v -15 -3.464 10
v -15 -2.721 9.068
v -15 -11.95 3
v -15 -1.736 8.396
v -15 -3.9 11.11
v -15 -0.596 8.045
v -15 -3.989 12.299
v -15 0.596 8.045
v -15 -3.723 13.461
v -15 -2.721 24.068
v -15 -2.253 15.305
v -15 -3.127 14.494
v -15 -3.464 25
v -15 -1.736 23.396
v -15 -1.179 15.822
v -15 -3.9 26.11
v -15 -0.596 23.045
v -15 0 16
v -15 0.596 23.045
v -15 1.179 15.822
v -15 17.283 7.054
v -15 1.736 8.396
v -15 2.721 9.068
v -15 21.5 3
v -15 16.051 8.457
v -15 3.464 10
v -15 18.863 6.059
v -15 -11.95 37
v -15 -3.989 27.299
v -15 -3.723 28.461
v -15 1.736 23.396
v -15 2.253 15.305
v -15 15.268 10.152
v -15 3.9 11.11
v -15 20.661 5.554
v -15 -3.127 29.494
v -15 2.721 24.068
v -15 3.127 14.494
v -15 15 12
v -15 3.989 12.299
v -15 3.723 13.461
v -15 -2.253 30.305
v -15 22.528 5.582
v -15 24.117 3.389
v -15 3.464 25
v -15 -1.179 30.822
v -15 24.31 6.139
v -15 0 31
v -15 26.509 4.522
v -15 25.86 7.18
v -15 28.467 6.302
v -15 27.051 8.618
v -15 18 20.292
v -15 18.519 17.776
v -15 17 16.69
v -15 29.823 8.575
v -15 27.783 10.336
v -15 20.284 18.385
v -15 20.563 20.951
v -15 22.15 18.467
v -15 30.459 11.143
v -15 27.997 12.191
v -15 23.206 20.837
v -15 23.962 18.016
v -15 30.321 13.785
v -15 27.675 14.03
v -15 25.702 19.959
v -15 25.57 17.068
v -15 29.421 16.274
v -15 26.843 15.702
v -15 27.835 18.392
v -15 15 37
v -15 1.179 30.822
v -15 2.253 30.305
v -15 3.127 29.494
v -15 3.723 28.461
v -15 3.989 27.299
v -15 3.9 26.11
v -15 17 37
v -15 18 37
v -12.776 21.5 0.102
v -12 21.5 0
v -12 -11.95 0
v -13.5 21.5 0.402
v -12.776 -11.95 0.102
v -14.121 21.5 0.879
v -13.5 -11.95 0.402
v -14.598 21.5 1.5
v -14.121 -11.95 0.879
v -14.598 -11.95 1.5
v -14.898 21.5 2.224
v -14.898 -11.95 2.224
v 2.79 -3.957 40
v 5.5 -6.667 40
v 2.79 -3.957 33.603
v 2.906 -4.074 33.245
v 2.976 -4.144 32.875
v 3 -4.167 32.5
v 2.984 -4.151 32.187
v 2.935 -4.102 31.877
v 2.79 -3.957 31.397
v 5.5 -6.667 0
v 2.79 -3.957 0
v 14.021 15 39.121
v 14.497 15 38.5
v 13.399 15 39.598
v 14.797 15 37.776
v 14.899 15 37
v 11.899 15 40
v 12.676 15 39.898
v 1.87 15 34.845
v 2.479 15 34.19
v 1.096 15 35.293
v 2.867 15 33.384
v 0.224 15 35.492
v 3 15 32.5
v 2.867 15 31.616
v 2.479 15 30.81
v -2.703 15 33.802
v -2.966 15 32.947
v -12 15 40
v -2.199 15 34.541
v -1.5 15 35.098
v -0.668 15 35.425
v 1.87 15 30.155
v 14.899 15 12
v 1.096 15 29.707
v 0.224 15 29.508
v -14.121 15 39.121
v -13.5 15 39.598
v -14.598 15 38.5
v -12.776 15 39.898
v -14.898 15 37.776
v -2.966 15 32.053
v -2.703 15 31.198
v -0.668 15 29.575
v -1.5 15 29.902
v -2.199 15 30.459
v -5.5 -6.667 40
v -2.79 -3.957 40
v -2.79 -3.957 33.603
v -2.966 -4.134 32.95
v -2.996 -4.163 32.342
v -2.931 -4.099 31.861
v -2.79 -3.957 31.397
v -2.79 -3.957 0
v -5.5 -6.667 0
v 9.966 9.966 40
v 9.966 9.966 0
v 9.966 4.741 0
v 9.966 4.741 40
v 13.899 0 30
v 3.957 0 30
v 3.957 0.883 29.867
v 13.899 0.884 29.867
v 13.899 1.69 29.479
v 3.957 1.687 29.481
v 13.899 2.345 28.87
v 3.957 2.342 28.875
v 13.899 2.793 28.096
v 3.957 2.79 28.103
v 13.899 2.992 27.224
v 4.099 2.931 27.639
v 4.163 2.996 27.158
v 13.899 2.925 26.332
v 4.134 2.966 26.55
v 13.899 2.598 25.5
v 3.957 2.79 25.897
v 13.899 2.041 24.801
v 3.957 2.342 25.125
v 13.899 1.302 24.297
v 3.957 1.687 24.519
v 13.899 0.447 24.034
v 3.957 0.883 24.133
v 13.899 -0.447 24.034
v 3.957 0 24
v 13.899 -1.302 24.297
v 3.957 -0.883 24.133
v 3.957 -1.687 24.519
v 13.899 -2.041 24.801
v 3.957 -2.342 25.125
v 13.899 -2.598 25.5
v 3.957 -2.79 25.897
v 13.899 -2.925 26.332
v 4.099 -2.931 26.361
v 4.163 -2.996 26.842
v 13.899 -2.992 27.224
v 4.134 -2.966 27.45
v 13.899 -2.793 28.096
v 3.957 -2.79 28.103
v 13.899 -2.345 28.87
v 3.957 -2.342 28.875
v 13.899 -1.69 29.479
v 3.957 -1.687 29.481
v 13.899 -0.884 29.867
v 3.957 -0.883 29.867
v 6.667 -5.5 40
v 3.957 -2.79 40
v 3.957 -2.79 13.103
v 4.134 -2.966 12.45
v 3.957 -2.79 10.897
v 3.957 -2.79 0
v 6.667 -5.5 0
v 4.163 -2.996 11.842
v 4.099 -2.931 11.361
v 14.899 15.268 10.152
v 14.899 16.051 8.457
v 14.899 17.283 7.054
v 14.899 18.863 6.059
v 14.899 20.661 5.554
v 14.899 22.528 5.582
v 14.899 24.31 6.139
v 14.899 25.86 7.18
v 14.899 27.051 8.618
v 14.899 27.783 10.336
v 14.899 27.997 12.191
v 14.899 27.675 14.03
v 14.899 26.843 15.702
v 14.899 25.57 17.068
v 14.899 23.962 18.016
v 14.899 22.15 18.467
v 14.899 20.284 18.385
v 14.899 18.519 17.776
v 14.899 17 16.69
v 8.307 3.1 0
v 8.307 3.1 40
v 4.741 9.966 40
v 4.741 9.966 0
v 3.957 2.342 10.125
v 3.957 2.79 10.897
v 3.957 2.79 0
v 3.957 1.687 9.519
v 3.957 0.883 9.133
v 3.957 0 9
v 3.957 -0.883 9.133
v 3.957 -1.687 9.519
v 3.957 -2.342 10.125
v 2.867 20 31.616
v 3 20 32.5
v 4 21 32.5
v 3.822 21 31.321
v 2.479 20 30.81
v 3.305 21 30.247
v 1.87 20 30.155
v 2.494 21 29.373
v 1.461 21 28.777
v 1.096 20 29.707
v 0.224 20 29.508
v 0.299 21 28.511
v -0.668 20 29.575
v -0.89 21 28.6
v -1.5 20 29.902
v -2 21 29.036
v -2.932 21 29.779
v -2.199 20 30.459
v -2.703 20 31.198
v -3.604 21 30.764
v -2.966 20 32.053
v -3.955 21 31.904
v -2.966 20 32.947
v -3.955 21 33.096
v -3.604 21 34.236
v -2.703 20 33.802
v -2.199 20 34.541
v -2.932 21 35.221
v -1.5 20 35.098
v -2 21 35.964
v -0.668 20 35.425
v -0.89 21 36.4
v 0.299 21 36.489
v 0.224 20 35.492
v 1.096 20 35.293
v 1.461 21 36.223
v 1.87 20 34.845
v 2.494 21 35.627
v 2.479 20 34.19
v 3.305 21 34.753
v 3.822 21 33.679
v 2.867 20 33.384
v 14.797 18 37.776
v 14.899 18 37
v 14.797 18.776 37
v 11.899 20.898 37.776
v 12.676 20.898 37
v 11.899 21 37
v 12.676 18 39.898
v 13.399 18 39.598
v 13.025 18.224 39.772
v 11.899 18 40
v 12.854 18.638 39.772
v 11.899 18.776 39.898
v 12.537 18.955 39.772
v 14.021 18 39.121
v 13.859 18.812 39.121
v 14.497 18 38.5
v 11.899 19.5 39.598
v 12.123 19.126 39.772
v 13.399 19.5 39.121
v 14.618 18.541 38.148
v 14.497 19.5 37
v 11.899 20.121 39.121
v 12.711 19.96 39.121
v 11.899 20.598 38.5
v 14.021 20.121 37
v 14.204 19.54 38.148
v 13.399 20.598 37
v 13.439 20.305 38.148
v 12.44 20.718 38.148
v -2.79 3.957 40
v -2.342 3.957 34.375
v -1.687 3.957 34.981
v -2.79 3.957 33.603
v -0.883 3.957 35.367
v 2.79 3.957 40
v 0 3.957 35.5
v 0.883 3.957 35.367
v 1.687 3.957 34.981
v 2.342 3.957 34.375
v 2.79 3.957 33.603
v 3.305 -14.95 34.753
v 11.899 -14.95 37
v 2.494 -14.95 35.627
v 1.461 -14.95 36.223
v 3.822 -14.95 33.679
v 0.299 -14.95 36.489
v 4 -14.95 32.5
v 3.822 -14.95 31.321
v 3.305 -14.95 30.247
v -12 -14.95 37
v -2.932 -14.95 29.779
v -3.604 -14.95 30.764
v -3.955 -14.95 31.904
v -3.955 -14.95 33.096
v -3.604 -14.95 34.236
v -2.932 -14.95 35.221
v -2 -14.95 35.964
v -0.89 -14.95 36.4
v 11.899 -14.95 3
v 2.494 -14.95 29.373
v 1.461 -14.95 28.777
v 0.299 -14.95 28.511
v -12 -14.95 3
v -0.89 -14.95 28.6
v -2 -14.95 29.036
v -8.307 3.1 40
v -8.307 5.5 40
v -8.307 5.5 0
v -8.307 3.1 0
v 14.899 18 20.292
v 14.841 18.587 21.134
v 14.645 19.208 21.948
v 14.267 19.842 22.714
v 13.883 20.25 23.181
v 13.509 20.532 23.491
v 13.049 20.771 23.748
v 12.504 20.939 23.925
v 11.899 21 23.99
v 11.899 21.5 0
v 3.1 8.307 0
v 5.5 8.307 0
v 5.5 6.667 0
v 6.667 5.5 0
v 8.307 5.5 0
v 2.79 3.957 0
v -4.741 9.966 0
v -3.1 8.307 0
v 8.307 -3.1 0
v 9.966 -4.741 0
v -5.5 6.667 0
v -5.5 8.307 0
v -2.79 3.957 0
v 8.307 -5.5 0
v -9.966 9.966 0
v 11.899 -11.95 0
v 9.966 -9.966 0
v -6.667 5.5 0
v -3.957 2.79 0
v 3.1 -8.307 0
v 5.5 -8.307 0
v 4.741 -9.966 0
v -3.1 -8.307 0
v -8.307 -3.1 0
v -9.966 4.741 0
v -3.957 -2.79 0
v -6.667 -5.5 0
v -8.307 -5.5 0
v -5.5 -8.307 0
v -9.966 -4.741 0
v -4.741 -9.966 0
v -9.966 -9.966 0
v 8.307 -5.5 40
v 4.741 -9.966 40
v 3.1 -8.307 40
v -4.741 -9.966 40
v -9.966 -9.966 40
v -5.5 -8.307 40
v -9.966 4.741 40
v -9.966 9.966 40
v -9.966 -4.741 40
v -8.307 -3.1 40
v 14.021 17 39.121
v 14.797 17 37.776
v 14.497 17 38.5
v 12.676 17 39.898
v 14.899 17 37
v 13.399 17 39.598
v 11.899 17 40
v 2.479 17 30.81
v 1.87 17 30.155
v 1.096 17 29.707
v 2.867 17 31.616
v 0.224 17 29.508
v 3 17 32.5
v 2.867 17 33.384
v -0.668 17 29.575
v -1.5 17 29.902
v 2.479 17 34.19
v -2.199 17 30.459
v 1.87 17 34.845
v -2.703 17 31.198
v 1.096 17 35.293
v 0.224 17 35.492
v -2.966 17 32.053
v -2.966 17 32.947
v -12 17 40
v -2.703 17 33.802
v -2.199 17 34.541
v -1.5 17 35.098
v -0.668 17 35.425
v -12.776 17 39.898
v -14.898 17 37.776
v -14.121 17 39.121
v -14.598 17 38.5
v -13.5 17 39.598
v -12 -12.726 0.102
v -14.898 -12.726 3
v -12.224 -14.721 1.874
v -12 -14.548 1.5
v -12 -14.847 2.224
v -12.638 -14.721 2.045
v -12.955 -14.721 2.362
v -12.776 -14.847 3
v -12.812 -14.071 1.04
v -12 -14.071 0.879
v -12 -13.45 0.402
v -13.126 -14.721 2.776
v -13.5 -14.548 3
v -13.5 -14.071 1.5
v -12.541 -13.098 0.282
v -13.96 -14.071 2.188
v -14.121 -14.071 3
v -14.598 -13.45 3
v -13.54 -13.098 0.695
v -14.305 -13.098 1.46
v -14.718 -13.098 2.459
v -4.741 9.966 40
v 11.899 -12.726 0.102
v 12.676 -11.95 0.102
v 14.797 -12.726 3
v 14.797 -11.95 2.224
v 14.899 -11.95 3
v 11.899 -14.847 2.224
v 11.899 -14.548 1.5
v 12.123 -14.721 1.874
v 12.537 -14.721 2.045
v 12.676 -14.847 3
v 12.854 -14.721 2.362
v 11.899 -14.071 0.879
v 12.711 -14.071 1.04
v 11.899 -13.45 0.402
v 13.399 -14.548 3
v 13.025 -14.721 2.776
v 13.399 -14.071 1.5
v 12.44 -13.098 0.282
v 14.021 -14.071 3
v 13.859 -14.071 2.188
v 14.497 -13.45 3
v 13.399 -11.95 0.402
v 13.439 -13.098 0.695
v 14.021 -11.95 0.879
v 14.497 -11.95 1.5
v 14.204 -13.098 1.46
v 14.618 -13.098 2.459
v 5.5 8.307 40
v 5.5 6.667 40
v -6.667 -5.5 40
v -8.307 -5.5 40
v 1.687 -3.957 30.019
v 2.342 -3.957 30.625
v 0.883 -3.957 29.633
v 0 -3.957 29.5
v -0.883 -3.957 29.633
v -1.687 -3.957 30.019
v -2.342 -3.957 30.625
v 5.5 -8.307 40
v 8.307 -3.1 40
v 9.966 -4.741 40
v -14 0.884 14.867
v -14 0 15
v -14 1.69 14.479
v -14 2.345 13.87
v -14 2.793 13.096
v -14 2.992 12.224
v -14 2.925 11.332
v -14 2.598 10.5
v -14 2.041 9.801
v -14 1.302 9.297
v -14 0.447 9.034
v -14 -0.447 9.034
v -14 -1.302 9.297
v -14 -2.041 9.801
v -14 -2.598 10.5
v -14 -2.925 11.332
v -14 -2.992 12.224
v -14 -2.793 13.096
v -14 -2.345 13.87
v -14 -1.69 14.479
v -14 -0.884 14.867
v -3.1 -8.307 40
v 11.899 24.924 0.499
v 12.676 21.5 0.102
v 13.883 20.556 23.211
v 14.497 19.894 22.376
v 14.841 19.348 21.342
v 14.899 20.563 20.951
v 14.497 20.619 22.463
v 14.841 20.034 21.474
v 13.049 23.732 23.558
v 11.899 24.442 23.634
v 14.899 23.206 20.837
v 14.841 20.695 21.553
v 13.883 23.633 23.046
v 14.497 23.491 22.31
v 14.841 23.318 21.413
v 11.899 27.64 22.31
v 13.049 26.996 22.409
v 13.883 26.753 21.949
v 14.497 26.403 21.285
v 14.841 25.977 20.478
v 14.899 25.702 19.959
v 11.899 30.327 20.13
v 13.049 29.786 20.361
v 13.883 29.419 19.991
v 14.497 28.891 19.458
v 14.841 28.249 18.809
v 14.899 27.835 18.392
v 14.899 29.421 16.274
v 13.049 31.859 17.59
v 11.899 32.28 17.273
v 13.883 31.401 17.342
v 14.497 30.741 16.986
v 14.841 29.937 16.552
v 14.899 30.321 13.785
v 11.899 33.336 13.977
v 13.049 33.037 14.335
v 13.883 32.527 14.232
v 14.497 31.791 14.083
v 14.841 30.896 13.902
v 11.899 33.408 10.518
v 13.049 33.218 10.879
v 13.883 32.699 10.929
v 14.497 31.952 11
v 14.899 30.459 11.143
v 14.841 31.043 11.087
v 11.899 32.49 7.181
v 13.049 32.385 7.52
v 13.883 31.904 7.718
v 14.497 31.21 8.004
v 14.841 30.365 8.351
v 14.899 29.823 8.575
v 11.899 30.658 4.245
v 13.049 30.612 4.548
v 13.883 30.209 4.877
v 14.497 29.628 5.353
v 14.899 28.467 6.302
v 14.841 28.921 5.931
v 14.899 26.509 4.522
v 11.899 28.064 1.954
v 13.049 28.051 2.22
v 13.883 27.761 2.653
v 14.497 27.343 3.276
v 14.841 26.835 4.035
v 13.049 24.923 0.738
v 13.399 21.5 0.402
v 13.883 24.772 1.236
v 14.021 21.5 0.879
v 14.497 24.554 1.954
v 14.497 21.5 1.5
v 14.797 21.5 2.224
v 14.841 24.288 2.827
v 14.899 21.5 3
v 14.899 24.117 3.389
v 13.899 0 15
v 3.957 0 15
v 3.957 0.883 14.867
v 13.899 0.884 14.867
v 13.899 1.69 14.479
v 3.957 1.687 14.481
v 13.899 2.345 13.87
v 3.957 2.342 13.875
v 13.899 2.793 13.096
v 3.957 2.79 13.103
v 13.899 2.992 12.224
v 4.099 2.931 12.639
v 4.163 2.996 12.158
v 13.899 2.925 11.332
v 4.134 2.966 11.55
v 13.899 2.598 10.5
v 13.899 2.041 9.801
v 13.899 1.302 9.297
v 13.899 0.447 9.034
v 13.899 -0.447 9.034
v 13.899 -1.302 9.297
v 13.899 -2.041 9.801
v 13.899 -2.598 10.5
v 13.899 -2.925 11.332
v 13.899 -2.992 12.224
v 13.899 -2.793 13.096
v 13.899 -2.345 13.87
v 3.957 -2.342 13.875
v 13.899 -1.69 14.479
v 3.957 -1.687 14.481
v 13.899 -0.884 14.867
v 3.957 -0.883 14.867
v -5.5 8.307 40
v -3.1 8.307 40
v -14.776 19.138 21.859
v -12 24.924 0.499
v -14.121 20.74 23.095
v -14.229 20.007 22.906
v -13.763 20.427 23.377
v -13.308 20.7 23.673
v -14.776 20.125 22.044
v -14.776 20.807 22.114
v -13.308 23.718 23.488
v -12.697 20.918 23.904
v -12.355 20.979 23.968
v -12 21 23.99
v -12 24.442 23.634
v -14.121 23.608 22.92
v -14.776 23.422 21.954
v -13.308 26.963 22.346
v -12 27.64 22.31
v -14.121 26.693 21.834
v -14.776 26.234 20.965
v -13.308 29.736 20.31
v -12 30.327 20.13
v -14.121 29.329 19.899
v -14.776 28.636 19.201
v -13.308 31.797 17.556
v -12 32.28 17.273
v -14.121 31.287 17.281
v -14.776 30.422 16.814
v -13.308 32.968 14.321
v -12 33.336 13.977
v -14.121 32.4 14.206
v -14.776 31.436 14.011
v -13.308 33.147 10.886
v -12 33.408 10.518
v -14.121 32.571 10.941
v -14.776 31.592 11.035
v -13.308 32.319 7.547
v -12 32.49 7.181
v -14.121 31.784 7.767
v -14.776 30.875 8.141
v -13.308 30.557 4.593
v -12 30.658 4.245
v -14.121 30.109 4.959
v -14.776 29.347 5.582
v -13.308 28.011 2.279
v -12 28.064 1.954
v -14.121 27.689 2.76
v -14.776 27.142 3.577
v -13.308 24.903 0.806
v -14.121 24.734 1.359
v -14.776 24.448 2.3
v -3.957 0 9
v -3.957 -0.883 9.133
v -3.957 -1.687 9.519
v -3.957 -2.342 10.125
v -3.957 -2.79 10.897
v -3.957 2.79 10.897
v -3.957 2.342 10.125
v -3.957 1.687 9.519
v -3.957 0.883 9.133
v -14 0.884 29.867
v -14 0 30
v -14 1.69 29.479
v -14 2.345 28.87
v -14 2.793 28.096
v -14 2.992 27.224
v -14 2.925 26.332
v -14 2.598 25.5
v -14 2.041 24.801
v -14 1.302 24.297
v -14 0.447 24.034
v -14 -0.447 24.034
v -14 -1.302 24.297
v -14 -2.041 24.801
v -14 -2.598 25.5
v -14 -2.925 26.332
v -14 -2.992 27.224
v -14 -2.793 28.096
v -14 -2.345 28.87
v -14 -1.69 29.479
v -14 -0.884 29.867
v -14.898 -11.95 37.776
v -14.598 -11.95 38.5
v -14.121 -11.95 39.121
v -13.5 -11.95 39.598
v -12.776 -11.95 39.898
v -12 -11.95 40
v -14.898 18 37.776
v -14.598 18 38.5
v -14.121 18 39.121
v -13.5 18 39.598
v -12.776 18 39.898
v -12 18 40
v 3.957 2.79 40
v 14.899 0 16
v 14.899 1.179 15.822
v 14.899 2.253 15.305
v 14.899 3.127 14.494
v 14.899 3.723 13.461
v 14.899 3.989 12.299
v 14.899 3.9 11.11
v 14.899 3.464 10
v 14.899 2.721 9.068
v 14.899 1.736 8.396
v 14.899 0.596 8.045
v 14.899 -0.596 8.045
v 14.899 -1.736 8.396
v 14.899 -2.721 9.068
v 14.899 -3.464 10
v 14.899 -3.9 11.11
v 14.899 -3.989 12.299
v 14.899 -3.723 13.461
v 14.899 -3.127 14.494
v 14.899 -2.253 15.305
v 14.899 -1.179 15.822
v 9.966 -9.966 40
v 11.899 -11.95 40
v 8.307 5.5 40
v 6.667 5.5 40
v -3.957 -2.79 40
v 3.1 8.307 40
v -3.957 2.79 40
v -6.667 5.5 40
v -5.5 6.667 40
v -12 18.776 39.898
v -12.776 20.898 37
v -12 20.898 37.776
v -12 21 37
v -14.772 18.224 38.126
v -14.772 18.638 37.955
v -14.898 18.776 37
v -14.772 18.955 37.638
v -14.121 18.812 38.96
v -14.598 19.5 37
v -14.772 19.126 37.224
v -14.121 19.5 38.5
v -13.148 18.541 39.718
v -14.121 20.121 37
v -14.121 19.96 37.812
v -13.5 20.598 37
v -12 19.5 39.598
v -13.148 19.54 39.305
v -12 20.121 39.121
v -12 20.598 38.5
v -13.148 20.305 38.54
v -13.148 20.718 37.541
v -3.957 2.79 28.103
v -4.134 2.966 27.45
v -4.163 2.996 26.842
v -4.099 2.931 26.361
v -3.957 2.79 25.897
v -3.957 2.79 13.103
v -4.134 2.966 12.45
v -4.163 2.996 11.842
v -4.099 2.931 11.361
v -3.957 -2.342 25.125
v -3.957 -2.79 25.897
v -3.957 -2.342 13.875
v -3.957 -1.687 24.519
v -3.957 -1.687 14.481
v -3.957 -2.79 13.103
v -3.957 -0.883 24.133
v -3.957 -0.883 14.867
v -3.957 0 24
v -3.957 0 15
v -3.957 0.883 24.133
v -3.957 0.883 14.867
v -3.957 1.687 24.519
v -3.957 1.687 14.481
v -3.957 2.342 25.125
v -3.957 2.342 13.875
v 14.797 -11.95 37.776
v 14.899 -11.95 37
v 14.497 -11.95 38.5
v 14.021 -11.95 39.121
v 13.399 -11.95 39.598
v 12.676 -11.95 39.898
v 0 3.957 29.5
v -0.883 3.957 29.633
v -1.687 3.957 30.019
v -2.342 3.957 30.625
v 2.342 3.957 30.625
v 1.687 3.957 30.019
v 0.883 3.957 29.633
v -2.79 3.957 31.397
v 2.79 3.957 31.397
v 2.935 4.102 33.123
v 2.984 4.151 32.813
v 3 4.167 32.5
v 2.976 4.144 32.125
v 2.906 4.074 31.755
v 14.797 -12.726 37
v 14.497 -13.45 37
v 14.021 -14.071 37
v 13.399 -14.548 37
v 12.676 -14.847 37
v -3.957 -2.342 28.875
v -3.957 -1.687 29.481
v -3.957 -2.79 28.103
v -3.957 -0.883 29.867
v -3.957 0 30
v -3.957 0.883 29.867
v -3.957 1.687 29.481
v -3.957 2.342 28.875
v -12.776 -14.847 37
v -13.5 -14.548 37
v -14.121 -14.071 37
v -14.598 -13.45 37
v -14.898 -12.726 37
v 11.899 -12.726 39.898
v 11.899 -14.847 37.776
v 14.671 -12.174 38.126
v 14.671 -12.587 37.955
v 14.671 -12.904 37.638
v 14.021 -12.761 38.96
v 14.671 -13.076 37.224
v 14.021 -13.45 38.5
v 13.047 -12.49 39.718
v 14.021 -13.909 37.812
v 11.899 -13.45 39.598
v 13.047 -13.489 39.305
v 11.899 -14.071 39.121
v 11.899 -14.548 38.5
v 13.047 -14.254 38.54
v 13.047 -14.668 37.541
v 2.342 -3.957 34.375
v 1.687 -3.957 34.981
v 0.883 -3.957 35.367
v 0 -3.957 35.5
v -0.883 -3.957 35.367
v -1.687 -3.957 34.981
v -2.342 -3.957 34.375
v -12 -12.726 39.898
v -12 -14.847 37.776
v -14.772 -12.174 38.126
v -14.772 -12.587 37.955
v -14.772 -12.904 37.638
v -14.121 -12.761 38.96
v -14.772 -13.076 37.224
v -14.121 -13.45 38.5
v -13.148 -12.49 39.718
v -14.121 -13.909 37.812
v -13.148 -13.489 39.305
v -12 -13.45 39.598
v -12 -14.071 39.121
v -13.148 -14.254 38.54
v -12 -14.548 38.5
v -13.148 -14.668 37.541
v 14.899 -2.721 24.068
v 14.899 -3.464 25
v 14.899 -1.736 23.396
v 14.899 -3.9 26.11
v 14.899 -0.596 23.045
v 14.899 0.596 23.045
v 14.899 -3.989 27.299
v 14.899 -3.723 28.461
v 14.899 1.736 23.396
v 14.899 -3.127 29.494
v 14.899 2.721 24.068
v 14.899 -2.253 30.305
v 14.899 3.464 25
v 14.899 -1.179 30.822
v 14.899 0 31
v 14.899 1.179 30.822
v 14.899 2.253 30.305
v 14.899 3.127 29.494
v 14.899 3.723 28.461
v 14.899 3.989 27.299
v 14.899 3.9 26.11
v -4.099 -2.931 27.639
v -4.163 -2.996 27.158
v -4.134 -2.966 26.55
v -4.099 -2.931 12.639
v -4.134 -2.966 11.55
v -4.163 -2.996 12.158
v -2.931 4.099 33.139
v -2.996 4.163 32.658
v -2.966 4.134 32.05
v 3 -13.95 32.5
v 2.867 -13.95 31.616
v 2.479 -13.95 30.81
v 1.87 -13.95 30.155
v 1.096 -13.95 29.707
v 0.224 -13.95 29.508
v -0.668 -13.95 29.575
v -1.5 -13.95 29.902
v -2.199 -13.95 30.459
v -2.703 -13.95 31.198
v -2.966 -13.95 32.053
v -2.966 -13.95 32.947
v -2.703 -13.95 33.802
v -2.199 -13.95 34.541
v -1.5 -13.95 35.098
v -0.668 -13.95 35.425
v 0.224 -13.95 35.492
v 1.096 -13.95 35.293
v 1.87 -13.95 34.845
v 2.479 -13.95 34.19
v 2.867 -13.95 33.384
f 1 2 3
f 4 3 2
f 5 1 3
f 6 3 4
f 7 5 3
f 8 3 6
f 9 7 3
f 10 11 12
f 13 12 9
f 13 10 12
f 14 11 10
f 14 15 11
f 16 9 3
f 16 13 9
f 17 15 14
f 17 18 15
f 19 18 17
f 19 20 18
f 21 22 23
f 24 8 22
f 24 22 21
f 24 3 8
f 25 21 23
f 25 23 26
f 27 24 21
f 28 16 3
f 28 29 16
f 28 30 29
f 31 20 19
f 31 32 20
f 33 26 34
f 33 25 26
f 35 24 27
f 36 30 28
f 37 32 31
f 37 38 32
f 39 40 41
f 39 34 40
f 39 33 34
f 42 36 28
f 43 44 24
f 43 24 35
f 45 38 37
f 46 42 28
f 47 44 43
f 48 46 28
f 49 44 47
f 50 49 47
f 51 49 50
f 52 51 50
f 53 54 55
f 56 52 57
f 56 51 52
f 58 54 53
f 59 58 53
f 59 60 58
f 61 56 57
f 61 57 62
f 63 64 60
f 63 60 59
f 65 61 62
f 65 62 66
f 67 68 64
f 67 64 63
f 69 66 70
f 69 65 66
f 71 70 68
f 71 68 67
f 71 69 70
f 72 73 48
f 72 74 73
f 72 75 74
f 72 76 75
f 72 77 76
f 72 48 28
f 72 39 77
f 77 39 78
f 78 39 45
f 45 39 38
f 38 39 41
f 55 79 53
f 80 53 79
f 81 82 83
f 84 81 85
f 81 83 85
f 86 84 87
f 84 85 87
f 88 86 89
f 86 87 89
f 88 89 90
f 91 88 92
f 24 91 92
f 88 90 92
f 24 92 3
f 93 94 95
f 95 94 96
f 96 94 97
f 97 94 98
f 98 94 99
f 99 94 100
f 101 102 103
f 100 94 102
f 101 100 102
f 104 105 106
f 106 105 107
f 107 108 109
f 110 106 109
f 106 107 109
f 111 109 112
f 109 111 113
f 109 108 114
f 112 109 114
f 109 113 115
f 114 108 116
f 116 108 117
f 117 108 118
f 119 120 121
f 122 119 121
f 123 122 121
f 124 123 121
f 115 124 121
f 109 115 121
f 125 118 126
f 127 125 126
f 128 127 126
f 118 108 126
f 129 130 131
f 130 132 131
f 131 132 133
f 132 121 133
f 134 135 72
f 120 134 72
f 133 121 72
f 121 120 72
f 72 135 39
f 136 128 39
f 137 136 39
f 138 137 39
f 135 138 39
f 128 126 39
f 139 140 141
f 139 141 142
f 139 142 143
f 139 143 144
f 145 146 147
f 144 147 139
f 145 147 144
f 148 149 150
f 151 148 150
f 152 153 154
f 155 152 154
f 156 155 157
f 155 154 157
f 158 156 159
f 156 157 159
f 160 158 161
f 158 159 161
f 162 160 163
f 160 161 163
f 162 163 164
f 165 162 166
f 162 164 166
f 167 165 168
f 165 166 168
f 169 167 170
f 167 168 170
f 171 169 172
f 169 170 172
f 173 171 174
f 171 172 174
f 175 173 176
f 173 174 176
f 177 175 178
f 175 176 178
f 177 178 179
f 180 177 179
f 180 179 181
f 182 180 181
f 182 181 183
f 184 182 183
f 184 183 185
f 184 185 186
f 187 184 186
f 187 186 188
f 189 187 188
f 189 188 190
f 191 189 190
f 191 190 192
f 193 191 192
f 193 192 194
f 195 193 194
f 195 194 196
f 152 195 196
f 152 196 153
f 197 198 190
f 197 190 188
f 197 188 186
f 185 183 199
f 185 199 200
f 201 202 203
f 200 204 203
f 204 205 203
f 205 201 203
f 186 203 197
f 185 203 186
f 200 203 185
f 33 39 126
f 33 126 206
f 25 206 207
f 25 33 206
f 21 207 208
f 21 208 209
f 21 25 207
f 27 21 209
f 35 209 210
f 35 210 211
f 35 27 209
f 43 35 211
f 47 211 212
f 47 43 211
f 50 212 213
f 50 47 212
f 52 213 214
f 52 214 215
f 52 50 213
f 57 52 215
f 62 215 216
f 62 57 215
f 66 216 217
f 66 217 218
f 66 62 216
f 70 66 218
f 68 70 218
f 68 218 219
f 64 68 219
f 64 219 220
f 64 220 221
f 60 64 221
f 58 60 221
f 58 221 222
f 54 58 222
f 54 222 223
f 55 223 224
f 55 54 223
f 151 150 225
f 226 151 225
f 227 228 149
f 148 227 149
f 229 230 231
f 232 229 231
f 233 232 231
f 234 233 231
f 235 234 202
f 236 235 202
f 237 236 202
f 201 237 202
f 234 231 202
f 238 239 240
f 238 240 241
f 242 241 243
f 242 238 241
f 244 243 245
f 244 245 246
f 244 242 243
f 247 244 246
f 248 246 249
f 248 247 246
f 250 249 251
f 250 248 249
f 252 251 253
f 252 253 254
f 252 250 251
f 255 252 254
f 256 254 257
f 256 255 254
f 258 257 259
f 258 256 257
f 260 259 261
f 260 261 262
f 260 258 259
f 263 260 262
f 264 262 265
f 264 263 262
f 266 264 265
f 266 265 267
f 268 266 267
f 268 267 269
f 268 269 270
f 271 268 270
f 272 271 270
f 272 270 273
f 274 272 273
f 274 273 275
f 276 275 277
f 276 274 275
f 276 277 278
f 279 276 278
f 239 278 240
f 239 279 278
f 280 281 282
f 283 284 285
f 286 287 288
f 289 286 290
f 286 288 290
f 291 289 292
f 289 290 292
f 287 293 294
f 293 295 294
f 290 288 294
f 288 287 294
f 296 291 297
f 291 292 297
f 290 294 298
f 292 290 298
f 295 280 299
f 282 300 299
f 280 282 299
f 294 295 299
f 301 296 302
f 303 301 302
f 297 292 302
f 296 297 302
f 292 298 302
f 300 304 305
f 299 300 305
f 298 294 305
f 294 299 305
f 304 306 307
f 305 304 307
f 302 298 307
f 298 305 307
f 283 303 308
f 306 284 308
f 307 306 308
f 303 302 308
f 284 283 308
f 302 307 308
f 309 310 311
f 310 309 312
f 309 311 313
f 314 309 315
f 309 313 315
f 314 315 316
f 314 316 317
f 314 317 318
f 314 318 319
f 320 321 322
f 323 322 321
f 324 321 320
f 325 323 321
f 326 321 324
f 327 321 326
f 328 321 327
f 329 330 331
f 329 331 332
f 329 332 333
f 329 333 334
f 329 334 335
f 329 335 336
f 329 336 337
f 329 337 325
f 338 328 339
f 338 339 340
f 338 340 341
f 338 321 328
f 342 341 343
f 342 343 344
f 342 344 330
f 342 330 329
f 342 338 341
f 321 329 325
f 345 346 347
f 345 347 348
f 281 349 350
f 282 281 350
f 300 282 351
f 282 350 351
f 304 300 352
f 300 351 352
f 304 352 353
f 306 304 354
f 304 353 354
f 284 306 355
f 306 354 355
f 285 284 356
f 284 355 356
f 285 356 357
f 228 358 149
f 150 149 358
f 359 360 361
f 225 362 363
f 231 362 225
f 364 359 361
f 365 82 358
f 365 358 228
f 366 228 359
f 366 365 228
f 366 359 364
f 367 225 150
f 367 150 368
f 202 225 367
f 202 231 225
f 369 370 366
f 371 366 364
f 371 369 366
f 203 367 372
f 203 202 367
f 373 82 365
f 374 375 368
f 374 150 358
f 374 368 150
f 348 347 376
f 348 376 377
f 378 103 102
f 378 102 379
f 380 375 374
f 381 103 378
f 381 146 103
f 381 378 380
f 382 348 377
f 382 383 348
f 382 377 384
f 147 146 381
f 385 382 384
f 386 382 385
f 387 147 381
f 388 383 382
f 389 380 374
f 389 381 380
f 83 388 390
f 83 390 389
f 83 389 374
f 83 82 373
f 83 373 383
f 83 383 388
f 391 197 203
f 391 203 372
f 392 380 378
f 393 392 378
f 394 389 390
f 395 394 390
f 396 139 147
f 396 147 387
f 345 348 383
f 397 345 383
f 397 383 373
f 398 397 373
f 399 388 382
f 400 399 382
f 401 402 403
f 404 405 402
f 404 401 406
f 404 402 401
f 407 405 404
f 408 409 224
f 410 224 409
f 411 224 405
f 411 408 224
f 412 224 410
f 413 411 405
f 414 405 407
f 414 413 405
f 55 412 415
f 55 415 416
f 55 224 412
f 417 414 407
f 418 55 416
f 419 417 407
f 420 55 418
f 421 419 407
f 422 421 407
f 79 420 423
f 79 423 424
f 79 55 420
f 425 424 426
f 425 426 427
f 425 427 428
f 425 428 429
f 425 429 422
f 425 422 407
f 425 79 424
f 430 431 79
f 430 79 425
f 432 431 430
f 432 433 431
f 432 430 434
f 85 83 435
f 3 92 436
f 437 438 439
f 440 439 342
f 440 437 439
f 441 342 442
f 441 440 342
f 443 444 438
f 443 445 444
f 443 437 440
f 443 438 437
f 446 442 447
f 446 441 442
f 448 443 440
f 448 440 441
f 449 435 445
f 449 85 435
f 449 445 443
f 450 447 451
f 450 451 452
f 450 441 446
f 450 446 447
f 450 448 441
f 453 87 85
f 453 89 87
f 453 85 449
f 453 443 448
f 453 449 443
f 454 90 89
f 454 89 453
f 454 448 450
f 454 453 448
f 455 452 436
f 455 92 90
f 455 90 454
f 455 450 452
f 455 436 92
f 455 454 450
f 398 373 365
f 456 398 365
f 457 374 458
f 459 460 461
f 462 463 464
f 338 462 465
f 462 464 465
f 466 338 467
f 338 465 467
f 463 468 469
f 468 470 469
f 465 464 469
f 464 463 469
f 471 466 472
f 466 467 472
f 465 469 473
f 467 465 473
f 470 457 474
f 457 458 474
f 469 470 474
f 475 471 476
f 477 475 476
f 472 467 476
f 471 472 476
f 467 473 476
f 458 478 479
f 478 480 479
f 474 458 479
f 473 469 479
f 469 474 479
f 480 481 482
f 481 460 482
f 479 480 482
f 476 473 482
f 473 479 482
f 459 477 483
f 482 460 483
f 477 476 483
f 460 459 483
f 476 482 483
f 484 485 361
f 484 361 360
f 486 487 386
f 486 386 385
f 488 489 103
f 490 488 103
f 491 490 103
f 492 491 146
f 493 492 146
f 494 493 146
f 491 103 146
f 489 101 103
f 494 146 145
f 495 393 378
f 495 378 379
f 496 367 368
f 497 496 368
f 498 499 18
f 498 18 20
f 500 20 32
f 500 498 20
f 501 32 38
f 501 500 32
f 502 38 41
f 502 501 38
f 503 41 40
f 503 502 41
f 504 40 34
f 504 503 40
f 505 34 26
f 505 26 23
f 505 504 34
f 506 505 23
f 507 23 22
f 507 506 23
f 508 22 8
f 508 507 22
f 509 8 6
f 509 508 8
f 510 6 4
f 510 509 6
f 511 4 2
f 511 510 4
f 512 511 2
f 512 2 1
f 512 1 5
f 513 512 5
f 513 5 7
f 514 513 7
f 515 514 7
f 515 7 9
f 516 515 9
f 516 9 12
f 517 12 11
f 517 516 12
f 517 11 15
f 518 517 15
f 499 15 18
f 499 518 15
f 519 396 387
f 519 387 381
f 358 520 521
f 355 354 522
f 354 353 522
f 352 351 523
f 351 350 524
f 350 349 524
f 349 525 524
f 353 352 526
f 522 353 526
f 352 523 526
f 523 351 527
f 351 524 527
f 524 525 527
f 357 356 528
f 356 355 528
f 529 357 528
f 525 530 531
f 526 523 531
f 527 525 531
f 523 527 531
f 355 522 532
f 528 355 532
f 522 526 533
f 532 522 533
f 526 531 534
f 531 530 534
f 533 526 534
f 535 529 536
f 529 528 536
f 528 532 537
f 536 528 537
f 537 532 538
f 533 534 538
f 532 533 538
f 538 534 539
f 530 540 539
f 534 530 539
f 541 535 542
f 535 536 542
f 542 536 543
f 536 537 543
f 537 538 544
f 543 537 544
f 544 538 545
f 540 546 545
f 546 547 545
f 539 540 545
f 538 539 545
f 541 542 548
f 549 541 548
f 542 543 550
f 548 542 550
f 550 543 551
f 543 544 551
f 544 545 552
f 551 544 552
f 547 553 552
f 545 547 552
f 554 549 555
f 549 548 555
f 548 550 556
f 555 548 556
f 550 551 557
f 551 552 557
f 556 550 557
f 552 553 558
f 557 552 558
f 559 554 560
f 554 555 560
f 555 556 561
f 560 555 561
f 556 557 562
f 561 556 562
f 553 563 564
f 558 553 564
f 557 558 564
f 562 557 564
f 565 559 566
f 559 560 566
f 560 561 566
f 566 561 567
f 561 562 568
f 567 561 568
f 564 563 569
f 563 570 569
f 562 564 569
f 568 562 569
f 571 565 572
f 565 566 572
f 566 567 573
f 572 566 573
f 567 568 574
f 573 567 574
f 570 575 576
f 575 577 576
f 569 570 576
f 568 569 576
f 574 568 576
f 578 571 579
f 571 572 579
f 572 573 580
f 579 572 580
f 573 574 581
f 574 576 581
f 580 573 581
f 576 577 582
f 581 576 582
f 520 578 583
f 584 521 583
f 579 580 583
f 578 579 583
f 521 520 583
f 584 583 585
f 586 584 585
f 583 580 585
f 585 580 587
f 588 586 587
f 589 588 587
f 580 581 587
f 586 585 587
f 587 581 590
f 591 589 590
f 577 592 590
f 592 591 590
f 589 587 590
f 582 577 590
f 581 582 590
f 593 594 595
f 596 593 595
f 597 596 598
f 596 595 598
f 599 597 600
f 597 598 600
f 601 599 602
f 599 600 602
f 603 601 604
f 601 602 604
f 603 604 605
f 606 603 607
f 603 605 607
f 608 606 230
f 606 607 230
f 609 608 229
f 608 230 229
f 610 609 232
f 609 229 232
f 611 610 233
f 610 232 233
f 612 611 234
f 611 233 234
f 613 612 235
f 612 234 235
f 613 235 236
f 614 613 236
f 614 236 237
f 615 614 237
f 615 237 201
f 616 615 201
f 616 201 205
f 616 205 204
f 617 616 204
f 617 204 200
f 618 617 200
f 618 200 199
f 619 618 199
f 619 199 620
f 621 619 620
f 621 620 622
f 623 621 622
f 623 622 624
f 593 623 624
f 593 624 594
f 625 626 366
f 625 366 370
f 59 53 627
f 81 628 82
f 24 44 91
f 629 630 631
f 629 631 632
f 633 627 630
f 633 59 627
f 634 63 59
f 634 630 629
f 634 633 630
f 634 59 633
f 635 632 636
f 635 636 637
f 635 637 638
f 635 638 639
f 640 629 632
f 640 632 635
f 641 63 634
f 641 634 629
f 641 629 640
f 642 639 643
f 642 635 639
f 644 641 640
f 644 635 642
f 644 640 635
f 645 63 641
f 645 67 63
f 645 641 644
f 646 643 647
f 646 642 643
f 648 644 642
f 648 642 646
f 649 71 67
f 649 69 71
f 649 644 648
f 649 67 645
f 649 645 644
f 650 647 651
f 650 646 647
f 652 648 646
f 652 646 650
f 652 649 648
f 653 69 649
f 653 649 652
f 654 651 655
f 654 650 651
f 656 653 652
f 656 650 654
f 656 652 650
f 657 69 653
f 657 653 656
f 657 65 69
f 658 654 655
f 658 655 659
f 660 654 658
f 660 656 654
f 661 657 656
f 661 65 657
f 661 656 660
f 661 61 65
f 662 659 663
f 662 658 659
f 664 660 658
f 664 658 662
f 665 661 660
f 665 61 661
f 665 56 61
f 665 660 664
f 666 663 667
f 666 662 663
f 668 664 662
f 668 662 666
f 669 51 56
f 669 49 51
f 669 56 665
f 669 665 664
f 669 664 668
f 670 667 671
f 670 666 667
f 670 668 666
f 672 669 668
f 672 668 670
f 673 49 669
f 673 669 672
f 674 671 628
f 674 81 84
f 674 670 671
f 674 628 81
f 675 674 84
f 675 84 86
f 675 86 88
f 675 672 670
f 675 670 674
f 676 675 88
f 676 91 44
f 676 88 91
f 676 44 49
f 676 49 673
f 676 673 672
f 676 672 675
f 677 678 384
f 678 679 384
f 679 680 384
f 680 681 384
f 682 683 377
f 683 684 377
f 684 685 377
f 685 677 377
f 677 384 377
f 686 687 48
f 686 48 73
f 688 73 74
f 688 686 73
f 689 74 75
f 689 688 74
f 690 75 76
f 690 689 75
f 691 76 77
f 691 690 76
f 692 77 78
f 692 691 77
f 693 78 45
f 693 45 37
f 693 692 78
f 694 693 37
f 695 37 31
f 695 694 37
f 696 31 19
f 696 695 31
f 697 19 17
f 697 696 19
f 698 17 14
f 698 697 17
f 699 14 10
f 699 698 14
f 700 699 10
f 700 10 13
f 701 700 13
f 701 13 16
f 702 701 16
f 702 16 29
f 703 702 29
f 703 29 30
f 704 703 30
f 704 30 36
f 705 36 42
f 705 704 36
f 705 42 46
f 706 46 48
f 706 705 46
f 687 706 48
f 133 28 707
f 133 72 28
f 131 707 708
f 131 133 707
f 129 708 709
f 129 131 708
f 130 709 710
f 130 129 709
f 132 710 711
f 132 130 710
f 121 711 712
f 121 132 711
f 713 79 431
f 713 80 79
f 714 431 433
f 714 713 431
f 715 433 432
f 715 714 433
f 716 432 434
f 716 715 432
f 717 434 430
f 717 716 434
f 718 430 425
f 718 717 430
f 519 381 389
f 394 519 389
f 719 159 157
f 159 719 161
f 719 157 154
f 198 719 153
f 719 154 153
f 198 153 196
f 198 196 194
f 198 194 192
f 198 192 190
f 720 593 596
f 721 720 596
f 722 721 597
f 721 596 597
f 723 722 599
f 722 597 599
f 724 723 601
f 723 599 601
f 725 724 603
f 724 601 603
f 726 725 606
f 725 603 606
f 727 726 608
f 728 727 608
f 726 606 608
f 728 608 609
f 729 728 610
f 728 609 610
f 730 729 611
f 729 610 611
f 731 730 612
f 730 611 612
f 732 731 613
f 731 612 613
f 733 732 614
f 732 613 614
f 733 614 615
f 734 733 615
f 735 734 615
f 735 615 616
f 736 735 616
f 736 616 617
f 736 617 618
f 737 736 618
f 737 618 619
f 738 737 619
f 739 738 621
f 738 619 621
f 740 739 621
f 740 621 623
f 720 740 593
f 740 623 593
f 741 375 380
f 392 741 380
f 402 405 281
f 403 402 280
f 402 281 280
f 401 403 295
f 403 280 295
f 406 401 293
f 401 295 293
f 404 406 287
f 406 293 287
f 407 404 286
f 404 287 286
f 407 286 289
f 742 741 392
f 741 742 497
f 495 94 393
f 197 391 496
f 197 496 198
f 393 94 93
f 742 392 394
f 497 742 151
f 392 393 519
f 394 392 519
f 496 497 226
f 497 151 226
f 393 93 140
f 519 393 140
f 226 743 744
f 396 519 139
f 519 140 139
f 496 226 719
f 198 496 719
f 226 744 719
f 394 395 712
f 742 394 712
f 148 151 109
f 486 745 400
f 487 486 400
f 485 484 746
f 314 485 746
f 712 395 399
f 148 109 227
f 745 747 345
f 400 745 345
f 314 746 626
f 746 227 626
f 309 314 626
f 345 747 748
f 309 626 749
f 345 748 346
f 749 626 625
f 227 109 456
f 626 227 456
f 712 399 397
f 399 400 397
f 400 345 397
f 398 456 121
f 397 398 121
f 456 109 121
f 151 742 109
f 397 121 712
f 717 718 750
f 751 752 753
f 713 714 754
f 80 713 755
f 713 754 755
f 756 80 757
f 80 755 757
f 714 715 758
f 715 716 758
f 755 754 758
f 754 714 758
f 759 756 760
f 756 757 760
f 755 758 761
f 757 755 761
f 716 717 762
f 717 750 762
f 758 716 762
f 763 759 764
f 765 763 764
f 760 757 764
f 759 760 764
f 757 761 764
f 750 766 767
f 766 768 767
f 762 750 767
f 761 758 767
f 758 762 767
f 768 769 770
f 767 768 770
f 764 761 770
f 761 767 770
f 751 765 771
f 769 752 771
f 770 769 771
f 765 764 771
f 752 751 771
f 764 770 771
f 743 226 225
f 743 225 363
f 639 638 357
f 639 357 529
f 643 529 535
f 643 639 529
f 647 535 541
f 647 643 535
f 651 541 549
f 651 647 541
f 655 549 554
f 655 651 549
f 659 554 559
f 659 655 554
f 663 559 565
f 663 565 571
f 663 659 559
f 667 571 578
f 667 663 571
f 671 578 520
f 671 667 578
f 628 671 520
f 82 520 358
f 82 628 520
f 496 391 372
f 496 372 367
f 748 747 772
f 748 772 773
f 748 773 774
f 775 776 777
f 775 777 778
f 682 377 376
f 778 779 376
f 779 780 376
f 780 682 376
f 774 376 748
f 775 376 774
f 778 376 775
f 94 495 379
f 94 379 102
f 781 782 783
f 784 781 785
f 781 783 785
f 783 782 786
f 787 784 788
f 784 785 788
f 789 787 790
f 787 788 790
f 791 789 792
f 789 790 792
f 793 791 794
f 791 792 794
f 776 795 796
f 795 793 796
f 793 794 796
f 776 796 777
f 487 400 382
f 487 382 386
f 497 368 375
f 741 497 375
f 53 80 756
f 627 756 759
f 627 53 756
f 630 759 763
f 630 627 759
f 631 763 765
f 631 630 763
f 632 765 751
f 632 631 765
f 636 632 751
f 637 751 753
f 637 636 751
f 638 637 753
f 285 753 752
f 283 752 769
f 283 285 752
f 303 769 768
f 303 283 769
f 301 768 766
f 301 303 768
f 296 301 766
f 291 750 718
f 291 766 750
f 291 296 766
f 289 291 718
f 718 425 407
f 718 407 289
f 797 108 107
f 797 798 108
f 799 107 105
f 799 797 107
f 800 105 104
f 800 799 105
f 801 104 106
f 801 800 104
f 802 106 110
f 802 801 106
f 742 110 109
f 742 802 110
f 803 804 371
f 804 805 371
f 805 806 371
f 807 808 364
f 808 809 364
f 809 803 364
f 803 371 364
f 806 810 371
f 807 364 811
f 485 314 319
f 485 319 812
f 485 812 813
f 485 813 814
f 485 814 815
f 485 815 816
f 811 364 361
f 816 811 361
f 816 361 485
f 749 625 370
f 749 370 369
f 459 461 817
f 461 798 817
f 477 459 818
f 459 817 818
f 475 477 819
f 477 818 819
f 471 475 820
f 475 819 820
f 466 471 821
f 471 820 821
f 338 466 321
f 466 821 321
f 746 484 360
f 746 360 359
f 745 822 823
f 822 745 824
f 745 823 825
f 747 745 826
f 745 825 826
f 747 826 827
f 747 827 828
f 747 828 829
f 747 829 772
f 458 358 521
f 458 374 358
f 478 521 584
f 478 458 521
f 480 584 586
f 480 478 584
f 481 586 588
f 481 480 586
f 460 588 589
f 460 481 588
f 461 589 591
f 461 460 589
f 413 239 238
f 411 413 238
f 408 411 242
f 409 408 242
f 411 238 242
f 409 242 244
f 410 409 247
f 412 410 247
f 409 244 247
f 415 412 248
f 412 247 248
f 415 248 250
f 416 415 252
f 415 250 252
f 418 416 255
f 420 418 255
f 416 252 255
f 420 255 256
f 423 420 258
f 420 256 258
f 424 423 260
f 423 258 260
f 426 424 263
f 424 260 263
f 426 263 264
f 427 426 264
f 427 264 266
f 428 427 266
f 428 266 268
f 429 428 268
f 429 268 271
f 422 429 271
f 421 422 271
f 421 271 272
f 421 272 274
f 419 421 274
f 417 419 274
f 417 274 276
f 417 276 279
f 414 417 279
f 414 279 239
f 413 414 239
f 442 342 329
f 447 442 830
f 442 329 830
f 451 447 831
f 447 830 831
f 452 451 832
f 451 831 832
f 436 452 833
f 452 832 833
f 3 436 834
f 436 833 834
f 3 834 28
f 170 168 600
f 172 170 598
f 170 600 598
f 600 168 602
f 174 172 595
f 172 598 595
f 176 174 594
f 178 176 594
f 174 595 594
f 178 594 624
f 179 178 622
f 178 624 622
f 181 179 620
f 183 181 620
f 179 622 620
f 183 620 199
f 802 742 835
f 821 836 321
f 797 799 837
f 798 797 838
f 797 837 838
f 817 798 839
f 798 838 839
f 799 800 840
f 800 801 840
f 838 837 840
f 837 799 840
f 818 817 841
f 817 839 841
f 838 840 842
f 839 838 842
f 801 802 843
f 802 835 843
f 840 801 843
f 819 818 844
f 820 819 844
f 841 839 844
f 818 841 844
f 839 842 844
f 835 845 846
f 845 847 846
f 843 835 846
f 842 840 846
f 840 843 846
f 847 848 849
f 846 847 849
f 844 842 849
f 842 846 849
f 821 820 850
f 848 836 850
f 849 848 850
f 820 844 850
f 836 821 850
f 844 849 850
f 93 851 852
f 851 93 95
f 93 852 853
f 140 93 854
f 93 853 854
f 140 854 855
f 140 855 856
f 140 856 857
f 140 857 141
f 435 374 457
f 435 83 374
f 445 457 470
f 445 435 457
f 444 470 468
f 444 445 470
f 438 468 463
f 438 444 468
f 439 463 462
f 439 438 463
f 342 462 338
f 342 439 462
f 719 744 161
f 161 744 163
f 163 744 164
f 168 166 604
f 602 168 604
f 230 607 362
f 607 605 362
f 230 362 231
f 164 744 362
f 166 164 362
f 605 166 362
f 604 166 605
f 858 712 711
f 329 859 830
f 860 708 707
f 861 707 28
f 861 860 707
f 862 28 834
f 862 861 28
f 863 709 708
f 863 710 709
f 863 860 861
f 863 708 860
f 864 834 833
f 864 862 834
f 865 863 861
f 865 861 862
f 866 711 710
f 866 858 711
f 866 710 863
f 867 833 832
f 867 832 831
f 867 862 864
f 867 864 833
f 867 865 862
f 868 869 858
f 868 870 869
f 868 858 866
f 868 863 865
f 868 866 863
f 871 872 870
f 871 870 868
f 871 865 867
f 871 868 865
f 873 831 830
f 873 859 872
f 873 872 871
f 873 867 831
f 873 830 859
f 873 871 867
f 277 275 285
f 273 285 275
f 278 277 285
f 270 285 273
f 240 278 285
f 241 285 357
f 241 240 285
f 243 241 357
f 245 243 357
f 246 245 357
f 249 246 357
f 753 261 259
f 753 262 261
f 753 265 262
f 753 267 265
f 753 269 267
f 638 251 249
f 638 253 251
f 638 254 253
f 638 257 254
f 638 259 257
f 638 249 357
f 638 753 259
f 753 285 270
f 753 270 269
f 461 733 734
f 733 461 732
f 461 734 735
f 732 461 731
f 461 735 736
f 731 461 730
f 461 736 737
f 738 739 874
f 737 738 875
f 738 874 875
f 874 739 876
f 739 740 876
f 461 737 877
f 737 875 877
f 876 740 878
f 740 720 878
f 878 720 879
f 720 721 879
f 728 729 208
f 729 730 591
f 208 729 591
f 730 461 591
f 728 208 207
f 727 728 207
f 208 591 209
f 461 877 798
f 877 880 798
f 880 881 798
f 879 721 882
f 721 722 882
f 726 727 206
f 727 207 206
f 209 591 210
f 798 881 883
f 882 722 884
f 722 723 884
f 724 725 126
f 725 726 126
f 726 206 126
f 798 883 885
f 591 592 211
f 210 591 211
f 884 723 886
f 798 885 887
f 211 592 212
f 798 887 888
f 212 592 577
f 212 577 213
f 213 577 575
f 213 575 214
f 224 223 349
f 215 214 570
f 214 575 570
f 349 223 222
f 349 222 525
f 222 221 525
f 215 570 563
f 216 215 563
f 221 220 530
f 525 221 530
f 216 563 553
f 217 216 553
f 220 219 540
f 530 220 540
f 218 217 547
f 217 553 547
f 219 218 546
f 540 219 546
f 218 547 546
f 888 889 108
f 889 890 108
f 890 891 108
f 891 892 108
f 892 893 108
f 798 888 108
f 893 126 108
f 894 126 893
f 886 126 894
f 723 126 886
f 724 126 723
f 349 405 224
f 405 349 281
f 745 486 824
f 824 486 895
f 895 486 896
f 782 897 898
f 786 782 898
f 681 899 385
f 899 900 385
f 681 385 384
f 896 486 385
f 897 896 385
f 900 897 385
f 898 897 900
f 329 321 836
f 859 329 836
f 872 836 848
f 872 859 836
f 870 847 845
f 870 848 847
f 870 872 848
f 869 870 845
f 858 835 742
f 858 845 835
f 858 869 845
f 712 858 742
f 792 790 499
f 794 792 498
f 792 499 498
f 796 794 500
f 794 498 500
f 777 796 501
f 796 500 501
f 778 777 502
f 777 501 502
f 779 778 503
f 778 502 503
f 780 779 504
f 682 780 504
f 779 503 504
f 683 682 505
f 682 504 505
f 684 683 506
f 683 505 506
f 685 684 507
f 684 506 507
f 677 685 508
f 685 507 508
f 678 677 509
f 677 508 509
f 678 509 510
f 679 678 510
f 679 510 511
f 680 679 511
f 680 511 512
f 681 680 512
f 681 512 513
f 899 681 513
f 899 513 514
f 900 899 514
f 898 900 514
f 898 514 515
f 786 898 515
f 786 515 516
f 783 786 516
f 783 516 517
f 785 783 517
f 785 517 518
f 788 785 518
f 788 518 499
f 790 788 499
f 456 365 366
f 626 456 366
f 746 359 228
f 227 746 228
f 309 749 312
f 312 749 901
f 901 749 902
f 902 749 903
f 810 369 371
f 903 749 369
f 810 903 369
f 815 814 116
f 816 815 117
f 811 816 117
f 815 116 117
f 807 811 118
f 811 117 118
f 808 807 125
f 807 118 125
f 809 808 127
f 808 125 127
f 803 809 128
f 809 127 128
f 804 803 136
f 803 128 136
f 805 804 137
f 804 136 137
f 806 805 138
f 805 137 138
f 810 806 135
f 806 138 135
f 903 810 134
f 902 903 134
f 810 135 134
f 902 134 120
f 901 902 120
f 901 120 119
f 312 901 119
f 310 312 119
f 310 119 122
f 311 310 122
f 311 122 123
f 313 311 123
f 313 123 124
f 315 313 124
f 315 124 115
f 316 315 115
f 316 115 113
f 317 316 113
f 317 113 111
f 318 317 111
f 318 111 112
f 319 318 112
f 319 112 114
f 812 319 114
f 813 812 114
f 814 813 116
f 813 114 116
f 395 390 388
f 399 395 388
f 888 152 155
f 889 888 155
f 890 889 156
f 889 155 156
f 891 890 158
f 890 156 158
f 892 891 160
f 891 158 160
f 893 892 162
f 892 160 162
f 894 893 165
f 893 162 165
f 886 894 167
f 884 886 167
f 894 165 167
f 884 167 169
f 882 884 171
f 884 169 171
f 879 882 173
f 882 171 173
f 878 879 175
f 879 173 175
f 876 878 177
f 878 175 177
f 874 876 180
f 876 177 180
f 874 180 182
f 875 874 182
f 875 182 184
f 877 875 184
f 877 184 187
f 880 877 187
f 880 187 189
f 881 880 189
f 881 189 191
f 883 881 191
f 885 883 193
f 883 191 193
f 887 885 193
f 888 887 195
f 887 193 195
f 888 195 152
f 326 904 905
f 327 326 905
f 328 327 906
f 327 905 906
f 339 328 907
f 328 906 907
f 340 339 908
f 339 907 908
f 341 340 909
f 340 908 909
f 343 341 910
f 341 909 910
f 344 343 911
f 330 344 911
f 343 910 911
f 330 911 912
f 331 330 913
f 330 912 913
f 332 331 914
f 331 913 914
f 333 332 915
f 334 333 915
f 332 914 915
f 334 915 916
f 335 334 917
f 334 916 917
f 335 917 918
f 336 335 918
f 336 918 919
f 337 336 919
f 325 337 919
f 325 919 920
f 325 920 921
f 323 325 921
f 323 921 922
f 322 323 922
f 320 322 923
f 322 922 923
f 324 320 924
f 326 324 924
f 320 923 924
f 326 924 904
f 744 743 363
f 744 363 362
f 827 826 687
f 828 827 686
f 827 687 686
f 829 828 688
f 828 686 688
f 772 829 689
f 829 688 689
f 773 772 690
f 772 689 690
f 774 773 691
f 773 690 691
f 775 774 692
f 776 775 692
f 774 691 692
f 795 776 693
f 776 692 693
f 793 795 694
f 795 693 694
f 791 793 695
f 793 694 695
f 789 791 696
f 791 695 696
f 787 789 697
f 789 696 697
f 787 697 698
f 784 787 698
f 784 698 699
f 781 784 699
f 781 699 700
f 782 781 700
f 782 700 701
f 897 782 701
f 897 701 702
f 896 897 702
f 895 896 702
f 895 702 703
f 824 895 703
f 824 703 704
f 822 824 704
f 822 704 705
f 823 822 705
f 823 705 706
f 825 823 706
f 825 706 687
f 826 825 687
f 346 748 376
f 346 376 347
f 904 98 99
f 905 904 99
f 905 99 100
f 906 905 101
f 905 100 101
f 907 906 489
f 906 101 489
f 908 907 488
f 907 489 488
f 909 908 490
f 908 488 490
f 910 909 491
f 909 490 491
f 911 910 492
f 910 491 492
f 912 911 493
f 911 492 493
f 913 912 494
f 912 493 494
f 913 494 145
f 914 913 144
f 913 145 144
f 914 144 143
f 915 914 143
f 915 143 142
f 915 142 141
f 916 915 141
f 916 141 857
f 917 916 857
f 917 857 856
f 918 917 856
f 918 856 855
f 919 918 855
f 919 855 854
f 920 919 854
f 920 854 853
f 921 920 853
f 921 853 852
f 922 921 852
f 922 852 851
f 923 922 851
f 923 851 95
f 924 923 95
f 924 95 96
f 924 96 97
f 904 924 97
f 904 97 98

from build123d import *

# Parameters (mm, degrees)
BOSS_EXTRUDE1_DEPTH = 40
BOSS_EXTRUDE3_DEPTH = 29.899298
SKETCH3_R           = 3
CUT_EXTRUDE1_DEPTH  = 30.899298
SKETCH4_R           = 3
CUT_EXTRUDE2_DEPTH  = 38.007847
FILLET1_R           = 3
CHAMFER1_SIZE       = 1


with BuildPart() as part:
    # Sketch1 → Boss-Extrude1 (new body)
    with BuildSketch(Plane.XY):
        Polygon((0, 15), (14.899298, 15), (14.899298, -14.949649), (-15, -14.949649), (-15, 15), align=None)
        Polygon((-9.966433, 9.966433), (-4.741433, 9.966433), (-3.1, 8.307461), (-5.5, 8.307461), (-5.5, 6.667461), (-2.79, 3.957461), (2.79, 3.957461), (5.5, 6.667461), (5.5, 8.307461), (3.1, 8.307461), (4.741433, 9.966433), (9.966433, 9.966433), (9.966433, 4.741433), (8.307461, 3.1), (8.307461, 5.5), (6.667461, 5.5), (3.957461, 2.79), (3.957461, -2.79), (6.667461, -5.5), (8.307461, -5.5), (8.307461, -3.1), (9.966433, -4.741433), (9.966433, -9.966433), (4.741433, -9.966433), (3.1, -8.307461), (5.5, -8.307461), (5.5, -6.667461), (2.79, -3.957461), (-2.79, -3.957461), (-5.5, -6.667461), (-5.5, -8.307461), (-3.1, -8.307461), (-4.741433, -9.966433), (-9.966433, -9.966433), (-9.966433, -4.741433), (-8.307461, -3.1), (-8.307461, -5.5), (-6.667461, -5.5), (-3.957461, -2.79), (-3.957461, 2.79), (-6.667461, 5.5), (-8.307461, 5.5), (-8.307461, 3.1), (-9.966433, 4.741433), align=None, mode=Mode.SUBTRACT)
    extrude(amount=BOSS_EXTRUDE1_DEPTH)

    # Sketch5 → Boss-Extrude3 (add, through all)
    with BuildSketch(Plane.ZY.offset(15)):
        with BuildLine():
            Line((0, 21.5), (0, 15))
            Line((0, 15), (12, 15))
            ThreePointArc((12, 15), (9.45049, 27.47913), (16.690416, 17))
            Line((16.690416, 17), (27.804488, 17))
            Line((27.804488, 17), (40, 17))
            Line((40, 17), (40, 21))
            Line((40, 21), (23.989579, 21))
            ThreePointArc((23.989579, 21), (12.250054, 33.497394), (0, 21.5))
        make_face()
    extrude(amount=-BOSS_EXTRUDE3_DEPTH)

    # Sketch3 → Cut-Extrude1 (cut, through all)
    with BuildSketch(Plane.ZY.offset(15)):
        with Locations((12, 0)):
            Circle(SKETCH3_R)
        with Locations((27, 0)):
            Circle(SKETCH3_R)
    extrude(amount=-CUT_EXTRUDE1_DEPTH, mode=Mode.SUBTRACT)

    # Sketch4 → Cut-Extrude2 (cut, through all)
    with BuildSketch(Plane(origin=(0, 22.058198, 0), x_dir=(1, 0, 0), z_dir=(0, 1, 0))):
        with Locations((0, -32.5)):
            Circle(SKETCH4_R)
    extrude(amount=-CUT_EXTRUDE2_DEPTH, mode=Mode.SUBTRACT)

    # Fillet1
    fillet1_edges = [part.edges().sort_by_distance(p)[0] for p in [
        (-0.050351, -14.949649, 40),
        (14.899298, 0.025175, 40),
        (14.899298, 33.497394, 12.250054),
        (14.899298, 21, 31.994789),
        (14.899298, 19, 40),
        (-0.050351, 21, 40),
        (-15, 19, 40),
        (-15, 21, 31.994789),
        (-15, 33.497394, 12.250054),
        (14.899298, 0.025175, 0),
        (-0.050351, -14.949649, 0),
        (-15, 3.275175, 0),
        (-15, 0.025175, 40),
        (14.899298, -14.949649, 20),
        (-15, -14.949649, 20),
    ]]
    fillet(fillet1_edges, radius=FILLET1_R)

    # Chamfer1
    chamfer1_edges = [part.edges().sort_by_distance(p)[0] for p in [
        (14.899298, 0, 9),
        (-15, 0, 9),
        (14.899298, 0, 24),
        (-15, 0, 24),
        (-3, -14.949649, 32.5),
        (-3, 21, 32.5),
    ]]
    chamfer(chamfer1_edges, length=CHAMFER1_SIZE)


solid = part.part
